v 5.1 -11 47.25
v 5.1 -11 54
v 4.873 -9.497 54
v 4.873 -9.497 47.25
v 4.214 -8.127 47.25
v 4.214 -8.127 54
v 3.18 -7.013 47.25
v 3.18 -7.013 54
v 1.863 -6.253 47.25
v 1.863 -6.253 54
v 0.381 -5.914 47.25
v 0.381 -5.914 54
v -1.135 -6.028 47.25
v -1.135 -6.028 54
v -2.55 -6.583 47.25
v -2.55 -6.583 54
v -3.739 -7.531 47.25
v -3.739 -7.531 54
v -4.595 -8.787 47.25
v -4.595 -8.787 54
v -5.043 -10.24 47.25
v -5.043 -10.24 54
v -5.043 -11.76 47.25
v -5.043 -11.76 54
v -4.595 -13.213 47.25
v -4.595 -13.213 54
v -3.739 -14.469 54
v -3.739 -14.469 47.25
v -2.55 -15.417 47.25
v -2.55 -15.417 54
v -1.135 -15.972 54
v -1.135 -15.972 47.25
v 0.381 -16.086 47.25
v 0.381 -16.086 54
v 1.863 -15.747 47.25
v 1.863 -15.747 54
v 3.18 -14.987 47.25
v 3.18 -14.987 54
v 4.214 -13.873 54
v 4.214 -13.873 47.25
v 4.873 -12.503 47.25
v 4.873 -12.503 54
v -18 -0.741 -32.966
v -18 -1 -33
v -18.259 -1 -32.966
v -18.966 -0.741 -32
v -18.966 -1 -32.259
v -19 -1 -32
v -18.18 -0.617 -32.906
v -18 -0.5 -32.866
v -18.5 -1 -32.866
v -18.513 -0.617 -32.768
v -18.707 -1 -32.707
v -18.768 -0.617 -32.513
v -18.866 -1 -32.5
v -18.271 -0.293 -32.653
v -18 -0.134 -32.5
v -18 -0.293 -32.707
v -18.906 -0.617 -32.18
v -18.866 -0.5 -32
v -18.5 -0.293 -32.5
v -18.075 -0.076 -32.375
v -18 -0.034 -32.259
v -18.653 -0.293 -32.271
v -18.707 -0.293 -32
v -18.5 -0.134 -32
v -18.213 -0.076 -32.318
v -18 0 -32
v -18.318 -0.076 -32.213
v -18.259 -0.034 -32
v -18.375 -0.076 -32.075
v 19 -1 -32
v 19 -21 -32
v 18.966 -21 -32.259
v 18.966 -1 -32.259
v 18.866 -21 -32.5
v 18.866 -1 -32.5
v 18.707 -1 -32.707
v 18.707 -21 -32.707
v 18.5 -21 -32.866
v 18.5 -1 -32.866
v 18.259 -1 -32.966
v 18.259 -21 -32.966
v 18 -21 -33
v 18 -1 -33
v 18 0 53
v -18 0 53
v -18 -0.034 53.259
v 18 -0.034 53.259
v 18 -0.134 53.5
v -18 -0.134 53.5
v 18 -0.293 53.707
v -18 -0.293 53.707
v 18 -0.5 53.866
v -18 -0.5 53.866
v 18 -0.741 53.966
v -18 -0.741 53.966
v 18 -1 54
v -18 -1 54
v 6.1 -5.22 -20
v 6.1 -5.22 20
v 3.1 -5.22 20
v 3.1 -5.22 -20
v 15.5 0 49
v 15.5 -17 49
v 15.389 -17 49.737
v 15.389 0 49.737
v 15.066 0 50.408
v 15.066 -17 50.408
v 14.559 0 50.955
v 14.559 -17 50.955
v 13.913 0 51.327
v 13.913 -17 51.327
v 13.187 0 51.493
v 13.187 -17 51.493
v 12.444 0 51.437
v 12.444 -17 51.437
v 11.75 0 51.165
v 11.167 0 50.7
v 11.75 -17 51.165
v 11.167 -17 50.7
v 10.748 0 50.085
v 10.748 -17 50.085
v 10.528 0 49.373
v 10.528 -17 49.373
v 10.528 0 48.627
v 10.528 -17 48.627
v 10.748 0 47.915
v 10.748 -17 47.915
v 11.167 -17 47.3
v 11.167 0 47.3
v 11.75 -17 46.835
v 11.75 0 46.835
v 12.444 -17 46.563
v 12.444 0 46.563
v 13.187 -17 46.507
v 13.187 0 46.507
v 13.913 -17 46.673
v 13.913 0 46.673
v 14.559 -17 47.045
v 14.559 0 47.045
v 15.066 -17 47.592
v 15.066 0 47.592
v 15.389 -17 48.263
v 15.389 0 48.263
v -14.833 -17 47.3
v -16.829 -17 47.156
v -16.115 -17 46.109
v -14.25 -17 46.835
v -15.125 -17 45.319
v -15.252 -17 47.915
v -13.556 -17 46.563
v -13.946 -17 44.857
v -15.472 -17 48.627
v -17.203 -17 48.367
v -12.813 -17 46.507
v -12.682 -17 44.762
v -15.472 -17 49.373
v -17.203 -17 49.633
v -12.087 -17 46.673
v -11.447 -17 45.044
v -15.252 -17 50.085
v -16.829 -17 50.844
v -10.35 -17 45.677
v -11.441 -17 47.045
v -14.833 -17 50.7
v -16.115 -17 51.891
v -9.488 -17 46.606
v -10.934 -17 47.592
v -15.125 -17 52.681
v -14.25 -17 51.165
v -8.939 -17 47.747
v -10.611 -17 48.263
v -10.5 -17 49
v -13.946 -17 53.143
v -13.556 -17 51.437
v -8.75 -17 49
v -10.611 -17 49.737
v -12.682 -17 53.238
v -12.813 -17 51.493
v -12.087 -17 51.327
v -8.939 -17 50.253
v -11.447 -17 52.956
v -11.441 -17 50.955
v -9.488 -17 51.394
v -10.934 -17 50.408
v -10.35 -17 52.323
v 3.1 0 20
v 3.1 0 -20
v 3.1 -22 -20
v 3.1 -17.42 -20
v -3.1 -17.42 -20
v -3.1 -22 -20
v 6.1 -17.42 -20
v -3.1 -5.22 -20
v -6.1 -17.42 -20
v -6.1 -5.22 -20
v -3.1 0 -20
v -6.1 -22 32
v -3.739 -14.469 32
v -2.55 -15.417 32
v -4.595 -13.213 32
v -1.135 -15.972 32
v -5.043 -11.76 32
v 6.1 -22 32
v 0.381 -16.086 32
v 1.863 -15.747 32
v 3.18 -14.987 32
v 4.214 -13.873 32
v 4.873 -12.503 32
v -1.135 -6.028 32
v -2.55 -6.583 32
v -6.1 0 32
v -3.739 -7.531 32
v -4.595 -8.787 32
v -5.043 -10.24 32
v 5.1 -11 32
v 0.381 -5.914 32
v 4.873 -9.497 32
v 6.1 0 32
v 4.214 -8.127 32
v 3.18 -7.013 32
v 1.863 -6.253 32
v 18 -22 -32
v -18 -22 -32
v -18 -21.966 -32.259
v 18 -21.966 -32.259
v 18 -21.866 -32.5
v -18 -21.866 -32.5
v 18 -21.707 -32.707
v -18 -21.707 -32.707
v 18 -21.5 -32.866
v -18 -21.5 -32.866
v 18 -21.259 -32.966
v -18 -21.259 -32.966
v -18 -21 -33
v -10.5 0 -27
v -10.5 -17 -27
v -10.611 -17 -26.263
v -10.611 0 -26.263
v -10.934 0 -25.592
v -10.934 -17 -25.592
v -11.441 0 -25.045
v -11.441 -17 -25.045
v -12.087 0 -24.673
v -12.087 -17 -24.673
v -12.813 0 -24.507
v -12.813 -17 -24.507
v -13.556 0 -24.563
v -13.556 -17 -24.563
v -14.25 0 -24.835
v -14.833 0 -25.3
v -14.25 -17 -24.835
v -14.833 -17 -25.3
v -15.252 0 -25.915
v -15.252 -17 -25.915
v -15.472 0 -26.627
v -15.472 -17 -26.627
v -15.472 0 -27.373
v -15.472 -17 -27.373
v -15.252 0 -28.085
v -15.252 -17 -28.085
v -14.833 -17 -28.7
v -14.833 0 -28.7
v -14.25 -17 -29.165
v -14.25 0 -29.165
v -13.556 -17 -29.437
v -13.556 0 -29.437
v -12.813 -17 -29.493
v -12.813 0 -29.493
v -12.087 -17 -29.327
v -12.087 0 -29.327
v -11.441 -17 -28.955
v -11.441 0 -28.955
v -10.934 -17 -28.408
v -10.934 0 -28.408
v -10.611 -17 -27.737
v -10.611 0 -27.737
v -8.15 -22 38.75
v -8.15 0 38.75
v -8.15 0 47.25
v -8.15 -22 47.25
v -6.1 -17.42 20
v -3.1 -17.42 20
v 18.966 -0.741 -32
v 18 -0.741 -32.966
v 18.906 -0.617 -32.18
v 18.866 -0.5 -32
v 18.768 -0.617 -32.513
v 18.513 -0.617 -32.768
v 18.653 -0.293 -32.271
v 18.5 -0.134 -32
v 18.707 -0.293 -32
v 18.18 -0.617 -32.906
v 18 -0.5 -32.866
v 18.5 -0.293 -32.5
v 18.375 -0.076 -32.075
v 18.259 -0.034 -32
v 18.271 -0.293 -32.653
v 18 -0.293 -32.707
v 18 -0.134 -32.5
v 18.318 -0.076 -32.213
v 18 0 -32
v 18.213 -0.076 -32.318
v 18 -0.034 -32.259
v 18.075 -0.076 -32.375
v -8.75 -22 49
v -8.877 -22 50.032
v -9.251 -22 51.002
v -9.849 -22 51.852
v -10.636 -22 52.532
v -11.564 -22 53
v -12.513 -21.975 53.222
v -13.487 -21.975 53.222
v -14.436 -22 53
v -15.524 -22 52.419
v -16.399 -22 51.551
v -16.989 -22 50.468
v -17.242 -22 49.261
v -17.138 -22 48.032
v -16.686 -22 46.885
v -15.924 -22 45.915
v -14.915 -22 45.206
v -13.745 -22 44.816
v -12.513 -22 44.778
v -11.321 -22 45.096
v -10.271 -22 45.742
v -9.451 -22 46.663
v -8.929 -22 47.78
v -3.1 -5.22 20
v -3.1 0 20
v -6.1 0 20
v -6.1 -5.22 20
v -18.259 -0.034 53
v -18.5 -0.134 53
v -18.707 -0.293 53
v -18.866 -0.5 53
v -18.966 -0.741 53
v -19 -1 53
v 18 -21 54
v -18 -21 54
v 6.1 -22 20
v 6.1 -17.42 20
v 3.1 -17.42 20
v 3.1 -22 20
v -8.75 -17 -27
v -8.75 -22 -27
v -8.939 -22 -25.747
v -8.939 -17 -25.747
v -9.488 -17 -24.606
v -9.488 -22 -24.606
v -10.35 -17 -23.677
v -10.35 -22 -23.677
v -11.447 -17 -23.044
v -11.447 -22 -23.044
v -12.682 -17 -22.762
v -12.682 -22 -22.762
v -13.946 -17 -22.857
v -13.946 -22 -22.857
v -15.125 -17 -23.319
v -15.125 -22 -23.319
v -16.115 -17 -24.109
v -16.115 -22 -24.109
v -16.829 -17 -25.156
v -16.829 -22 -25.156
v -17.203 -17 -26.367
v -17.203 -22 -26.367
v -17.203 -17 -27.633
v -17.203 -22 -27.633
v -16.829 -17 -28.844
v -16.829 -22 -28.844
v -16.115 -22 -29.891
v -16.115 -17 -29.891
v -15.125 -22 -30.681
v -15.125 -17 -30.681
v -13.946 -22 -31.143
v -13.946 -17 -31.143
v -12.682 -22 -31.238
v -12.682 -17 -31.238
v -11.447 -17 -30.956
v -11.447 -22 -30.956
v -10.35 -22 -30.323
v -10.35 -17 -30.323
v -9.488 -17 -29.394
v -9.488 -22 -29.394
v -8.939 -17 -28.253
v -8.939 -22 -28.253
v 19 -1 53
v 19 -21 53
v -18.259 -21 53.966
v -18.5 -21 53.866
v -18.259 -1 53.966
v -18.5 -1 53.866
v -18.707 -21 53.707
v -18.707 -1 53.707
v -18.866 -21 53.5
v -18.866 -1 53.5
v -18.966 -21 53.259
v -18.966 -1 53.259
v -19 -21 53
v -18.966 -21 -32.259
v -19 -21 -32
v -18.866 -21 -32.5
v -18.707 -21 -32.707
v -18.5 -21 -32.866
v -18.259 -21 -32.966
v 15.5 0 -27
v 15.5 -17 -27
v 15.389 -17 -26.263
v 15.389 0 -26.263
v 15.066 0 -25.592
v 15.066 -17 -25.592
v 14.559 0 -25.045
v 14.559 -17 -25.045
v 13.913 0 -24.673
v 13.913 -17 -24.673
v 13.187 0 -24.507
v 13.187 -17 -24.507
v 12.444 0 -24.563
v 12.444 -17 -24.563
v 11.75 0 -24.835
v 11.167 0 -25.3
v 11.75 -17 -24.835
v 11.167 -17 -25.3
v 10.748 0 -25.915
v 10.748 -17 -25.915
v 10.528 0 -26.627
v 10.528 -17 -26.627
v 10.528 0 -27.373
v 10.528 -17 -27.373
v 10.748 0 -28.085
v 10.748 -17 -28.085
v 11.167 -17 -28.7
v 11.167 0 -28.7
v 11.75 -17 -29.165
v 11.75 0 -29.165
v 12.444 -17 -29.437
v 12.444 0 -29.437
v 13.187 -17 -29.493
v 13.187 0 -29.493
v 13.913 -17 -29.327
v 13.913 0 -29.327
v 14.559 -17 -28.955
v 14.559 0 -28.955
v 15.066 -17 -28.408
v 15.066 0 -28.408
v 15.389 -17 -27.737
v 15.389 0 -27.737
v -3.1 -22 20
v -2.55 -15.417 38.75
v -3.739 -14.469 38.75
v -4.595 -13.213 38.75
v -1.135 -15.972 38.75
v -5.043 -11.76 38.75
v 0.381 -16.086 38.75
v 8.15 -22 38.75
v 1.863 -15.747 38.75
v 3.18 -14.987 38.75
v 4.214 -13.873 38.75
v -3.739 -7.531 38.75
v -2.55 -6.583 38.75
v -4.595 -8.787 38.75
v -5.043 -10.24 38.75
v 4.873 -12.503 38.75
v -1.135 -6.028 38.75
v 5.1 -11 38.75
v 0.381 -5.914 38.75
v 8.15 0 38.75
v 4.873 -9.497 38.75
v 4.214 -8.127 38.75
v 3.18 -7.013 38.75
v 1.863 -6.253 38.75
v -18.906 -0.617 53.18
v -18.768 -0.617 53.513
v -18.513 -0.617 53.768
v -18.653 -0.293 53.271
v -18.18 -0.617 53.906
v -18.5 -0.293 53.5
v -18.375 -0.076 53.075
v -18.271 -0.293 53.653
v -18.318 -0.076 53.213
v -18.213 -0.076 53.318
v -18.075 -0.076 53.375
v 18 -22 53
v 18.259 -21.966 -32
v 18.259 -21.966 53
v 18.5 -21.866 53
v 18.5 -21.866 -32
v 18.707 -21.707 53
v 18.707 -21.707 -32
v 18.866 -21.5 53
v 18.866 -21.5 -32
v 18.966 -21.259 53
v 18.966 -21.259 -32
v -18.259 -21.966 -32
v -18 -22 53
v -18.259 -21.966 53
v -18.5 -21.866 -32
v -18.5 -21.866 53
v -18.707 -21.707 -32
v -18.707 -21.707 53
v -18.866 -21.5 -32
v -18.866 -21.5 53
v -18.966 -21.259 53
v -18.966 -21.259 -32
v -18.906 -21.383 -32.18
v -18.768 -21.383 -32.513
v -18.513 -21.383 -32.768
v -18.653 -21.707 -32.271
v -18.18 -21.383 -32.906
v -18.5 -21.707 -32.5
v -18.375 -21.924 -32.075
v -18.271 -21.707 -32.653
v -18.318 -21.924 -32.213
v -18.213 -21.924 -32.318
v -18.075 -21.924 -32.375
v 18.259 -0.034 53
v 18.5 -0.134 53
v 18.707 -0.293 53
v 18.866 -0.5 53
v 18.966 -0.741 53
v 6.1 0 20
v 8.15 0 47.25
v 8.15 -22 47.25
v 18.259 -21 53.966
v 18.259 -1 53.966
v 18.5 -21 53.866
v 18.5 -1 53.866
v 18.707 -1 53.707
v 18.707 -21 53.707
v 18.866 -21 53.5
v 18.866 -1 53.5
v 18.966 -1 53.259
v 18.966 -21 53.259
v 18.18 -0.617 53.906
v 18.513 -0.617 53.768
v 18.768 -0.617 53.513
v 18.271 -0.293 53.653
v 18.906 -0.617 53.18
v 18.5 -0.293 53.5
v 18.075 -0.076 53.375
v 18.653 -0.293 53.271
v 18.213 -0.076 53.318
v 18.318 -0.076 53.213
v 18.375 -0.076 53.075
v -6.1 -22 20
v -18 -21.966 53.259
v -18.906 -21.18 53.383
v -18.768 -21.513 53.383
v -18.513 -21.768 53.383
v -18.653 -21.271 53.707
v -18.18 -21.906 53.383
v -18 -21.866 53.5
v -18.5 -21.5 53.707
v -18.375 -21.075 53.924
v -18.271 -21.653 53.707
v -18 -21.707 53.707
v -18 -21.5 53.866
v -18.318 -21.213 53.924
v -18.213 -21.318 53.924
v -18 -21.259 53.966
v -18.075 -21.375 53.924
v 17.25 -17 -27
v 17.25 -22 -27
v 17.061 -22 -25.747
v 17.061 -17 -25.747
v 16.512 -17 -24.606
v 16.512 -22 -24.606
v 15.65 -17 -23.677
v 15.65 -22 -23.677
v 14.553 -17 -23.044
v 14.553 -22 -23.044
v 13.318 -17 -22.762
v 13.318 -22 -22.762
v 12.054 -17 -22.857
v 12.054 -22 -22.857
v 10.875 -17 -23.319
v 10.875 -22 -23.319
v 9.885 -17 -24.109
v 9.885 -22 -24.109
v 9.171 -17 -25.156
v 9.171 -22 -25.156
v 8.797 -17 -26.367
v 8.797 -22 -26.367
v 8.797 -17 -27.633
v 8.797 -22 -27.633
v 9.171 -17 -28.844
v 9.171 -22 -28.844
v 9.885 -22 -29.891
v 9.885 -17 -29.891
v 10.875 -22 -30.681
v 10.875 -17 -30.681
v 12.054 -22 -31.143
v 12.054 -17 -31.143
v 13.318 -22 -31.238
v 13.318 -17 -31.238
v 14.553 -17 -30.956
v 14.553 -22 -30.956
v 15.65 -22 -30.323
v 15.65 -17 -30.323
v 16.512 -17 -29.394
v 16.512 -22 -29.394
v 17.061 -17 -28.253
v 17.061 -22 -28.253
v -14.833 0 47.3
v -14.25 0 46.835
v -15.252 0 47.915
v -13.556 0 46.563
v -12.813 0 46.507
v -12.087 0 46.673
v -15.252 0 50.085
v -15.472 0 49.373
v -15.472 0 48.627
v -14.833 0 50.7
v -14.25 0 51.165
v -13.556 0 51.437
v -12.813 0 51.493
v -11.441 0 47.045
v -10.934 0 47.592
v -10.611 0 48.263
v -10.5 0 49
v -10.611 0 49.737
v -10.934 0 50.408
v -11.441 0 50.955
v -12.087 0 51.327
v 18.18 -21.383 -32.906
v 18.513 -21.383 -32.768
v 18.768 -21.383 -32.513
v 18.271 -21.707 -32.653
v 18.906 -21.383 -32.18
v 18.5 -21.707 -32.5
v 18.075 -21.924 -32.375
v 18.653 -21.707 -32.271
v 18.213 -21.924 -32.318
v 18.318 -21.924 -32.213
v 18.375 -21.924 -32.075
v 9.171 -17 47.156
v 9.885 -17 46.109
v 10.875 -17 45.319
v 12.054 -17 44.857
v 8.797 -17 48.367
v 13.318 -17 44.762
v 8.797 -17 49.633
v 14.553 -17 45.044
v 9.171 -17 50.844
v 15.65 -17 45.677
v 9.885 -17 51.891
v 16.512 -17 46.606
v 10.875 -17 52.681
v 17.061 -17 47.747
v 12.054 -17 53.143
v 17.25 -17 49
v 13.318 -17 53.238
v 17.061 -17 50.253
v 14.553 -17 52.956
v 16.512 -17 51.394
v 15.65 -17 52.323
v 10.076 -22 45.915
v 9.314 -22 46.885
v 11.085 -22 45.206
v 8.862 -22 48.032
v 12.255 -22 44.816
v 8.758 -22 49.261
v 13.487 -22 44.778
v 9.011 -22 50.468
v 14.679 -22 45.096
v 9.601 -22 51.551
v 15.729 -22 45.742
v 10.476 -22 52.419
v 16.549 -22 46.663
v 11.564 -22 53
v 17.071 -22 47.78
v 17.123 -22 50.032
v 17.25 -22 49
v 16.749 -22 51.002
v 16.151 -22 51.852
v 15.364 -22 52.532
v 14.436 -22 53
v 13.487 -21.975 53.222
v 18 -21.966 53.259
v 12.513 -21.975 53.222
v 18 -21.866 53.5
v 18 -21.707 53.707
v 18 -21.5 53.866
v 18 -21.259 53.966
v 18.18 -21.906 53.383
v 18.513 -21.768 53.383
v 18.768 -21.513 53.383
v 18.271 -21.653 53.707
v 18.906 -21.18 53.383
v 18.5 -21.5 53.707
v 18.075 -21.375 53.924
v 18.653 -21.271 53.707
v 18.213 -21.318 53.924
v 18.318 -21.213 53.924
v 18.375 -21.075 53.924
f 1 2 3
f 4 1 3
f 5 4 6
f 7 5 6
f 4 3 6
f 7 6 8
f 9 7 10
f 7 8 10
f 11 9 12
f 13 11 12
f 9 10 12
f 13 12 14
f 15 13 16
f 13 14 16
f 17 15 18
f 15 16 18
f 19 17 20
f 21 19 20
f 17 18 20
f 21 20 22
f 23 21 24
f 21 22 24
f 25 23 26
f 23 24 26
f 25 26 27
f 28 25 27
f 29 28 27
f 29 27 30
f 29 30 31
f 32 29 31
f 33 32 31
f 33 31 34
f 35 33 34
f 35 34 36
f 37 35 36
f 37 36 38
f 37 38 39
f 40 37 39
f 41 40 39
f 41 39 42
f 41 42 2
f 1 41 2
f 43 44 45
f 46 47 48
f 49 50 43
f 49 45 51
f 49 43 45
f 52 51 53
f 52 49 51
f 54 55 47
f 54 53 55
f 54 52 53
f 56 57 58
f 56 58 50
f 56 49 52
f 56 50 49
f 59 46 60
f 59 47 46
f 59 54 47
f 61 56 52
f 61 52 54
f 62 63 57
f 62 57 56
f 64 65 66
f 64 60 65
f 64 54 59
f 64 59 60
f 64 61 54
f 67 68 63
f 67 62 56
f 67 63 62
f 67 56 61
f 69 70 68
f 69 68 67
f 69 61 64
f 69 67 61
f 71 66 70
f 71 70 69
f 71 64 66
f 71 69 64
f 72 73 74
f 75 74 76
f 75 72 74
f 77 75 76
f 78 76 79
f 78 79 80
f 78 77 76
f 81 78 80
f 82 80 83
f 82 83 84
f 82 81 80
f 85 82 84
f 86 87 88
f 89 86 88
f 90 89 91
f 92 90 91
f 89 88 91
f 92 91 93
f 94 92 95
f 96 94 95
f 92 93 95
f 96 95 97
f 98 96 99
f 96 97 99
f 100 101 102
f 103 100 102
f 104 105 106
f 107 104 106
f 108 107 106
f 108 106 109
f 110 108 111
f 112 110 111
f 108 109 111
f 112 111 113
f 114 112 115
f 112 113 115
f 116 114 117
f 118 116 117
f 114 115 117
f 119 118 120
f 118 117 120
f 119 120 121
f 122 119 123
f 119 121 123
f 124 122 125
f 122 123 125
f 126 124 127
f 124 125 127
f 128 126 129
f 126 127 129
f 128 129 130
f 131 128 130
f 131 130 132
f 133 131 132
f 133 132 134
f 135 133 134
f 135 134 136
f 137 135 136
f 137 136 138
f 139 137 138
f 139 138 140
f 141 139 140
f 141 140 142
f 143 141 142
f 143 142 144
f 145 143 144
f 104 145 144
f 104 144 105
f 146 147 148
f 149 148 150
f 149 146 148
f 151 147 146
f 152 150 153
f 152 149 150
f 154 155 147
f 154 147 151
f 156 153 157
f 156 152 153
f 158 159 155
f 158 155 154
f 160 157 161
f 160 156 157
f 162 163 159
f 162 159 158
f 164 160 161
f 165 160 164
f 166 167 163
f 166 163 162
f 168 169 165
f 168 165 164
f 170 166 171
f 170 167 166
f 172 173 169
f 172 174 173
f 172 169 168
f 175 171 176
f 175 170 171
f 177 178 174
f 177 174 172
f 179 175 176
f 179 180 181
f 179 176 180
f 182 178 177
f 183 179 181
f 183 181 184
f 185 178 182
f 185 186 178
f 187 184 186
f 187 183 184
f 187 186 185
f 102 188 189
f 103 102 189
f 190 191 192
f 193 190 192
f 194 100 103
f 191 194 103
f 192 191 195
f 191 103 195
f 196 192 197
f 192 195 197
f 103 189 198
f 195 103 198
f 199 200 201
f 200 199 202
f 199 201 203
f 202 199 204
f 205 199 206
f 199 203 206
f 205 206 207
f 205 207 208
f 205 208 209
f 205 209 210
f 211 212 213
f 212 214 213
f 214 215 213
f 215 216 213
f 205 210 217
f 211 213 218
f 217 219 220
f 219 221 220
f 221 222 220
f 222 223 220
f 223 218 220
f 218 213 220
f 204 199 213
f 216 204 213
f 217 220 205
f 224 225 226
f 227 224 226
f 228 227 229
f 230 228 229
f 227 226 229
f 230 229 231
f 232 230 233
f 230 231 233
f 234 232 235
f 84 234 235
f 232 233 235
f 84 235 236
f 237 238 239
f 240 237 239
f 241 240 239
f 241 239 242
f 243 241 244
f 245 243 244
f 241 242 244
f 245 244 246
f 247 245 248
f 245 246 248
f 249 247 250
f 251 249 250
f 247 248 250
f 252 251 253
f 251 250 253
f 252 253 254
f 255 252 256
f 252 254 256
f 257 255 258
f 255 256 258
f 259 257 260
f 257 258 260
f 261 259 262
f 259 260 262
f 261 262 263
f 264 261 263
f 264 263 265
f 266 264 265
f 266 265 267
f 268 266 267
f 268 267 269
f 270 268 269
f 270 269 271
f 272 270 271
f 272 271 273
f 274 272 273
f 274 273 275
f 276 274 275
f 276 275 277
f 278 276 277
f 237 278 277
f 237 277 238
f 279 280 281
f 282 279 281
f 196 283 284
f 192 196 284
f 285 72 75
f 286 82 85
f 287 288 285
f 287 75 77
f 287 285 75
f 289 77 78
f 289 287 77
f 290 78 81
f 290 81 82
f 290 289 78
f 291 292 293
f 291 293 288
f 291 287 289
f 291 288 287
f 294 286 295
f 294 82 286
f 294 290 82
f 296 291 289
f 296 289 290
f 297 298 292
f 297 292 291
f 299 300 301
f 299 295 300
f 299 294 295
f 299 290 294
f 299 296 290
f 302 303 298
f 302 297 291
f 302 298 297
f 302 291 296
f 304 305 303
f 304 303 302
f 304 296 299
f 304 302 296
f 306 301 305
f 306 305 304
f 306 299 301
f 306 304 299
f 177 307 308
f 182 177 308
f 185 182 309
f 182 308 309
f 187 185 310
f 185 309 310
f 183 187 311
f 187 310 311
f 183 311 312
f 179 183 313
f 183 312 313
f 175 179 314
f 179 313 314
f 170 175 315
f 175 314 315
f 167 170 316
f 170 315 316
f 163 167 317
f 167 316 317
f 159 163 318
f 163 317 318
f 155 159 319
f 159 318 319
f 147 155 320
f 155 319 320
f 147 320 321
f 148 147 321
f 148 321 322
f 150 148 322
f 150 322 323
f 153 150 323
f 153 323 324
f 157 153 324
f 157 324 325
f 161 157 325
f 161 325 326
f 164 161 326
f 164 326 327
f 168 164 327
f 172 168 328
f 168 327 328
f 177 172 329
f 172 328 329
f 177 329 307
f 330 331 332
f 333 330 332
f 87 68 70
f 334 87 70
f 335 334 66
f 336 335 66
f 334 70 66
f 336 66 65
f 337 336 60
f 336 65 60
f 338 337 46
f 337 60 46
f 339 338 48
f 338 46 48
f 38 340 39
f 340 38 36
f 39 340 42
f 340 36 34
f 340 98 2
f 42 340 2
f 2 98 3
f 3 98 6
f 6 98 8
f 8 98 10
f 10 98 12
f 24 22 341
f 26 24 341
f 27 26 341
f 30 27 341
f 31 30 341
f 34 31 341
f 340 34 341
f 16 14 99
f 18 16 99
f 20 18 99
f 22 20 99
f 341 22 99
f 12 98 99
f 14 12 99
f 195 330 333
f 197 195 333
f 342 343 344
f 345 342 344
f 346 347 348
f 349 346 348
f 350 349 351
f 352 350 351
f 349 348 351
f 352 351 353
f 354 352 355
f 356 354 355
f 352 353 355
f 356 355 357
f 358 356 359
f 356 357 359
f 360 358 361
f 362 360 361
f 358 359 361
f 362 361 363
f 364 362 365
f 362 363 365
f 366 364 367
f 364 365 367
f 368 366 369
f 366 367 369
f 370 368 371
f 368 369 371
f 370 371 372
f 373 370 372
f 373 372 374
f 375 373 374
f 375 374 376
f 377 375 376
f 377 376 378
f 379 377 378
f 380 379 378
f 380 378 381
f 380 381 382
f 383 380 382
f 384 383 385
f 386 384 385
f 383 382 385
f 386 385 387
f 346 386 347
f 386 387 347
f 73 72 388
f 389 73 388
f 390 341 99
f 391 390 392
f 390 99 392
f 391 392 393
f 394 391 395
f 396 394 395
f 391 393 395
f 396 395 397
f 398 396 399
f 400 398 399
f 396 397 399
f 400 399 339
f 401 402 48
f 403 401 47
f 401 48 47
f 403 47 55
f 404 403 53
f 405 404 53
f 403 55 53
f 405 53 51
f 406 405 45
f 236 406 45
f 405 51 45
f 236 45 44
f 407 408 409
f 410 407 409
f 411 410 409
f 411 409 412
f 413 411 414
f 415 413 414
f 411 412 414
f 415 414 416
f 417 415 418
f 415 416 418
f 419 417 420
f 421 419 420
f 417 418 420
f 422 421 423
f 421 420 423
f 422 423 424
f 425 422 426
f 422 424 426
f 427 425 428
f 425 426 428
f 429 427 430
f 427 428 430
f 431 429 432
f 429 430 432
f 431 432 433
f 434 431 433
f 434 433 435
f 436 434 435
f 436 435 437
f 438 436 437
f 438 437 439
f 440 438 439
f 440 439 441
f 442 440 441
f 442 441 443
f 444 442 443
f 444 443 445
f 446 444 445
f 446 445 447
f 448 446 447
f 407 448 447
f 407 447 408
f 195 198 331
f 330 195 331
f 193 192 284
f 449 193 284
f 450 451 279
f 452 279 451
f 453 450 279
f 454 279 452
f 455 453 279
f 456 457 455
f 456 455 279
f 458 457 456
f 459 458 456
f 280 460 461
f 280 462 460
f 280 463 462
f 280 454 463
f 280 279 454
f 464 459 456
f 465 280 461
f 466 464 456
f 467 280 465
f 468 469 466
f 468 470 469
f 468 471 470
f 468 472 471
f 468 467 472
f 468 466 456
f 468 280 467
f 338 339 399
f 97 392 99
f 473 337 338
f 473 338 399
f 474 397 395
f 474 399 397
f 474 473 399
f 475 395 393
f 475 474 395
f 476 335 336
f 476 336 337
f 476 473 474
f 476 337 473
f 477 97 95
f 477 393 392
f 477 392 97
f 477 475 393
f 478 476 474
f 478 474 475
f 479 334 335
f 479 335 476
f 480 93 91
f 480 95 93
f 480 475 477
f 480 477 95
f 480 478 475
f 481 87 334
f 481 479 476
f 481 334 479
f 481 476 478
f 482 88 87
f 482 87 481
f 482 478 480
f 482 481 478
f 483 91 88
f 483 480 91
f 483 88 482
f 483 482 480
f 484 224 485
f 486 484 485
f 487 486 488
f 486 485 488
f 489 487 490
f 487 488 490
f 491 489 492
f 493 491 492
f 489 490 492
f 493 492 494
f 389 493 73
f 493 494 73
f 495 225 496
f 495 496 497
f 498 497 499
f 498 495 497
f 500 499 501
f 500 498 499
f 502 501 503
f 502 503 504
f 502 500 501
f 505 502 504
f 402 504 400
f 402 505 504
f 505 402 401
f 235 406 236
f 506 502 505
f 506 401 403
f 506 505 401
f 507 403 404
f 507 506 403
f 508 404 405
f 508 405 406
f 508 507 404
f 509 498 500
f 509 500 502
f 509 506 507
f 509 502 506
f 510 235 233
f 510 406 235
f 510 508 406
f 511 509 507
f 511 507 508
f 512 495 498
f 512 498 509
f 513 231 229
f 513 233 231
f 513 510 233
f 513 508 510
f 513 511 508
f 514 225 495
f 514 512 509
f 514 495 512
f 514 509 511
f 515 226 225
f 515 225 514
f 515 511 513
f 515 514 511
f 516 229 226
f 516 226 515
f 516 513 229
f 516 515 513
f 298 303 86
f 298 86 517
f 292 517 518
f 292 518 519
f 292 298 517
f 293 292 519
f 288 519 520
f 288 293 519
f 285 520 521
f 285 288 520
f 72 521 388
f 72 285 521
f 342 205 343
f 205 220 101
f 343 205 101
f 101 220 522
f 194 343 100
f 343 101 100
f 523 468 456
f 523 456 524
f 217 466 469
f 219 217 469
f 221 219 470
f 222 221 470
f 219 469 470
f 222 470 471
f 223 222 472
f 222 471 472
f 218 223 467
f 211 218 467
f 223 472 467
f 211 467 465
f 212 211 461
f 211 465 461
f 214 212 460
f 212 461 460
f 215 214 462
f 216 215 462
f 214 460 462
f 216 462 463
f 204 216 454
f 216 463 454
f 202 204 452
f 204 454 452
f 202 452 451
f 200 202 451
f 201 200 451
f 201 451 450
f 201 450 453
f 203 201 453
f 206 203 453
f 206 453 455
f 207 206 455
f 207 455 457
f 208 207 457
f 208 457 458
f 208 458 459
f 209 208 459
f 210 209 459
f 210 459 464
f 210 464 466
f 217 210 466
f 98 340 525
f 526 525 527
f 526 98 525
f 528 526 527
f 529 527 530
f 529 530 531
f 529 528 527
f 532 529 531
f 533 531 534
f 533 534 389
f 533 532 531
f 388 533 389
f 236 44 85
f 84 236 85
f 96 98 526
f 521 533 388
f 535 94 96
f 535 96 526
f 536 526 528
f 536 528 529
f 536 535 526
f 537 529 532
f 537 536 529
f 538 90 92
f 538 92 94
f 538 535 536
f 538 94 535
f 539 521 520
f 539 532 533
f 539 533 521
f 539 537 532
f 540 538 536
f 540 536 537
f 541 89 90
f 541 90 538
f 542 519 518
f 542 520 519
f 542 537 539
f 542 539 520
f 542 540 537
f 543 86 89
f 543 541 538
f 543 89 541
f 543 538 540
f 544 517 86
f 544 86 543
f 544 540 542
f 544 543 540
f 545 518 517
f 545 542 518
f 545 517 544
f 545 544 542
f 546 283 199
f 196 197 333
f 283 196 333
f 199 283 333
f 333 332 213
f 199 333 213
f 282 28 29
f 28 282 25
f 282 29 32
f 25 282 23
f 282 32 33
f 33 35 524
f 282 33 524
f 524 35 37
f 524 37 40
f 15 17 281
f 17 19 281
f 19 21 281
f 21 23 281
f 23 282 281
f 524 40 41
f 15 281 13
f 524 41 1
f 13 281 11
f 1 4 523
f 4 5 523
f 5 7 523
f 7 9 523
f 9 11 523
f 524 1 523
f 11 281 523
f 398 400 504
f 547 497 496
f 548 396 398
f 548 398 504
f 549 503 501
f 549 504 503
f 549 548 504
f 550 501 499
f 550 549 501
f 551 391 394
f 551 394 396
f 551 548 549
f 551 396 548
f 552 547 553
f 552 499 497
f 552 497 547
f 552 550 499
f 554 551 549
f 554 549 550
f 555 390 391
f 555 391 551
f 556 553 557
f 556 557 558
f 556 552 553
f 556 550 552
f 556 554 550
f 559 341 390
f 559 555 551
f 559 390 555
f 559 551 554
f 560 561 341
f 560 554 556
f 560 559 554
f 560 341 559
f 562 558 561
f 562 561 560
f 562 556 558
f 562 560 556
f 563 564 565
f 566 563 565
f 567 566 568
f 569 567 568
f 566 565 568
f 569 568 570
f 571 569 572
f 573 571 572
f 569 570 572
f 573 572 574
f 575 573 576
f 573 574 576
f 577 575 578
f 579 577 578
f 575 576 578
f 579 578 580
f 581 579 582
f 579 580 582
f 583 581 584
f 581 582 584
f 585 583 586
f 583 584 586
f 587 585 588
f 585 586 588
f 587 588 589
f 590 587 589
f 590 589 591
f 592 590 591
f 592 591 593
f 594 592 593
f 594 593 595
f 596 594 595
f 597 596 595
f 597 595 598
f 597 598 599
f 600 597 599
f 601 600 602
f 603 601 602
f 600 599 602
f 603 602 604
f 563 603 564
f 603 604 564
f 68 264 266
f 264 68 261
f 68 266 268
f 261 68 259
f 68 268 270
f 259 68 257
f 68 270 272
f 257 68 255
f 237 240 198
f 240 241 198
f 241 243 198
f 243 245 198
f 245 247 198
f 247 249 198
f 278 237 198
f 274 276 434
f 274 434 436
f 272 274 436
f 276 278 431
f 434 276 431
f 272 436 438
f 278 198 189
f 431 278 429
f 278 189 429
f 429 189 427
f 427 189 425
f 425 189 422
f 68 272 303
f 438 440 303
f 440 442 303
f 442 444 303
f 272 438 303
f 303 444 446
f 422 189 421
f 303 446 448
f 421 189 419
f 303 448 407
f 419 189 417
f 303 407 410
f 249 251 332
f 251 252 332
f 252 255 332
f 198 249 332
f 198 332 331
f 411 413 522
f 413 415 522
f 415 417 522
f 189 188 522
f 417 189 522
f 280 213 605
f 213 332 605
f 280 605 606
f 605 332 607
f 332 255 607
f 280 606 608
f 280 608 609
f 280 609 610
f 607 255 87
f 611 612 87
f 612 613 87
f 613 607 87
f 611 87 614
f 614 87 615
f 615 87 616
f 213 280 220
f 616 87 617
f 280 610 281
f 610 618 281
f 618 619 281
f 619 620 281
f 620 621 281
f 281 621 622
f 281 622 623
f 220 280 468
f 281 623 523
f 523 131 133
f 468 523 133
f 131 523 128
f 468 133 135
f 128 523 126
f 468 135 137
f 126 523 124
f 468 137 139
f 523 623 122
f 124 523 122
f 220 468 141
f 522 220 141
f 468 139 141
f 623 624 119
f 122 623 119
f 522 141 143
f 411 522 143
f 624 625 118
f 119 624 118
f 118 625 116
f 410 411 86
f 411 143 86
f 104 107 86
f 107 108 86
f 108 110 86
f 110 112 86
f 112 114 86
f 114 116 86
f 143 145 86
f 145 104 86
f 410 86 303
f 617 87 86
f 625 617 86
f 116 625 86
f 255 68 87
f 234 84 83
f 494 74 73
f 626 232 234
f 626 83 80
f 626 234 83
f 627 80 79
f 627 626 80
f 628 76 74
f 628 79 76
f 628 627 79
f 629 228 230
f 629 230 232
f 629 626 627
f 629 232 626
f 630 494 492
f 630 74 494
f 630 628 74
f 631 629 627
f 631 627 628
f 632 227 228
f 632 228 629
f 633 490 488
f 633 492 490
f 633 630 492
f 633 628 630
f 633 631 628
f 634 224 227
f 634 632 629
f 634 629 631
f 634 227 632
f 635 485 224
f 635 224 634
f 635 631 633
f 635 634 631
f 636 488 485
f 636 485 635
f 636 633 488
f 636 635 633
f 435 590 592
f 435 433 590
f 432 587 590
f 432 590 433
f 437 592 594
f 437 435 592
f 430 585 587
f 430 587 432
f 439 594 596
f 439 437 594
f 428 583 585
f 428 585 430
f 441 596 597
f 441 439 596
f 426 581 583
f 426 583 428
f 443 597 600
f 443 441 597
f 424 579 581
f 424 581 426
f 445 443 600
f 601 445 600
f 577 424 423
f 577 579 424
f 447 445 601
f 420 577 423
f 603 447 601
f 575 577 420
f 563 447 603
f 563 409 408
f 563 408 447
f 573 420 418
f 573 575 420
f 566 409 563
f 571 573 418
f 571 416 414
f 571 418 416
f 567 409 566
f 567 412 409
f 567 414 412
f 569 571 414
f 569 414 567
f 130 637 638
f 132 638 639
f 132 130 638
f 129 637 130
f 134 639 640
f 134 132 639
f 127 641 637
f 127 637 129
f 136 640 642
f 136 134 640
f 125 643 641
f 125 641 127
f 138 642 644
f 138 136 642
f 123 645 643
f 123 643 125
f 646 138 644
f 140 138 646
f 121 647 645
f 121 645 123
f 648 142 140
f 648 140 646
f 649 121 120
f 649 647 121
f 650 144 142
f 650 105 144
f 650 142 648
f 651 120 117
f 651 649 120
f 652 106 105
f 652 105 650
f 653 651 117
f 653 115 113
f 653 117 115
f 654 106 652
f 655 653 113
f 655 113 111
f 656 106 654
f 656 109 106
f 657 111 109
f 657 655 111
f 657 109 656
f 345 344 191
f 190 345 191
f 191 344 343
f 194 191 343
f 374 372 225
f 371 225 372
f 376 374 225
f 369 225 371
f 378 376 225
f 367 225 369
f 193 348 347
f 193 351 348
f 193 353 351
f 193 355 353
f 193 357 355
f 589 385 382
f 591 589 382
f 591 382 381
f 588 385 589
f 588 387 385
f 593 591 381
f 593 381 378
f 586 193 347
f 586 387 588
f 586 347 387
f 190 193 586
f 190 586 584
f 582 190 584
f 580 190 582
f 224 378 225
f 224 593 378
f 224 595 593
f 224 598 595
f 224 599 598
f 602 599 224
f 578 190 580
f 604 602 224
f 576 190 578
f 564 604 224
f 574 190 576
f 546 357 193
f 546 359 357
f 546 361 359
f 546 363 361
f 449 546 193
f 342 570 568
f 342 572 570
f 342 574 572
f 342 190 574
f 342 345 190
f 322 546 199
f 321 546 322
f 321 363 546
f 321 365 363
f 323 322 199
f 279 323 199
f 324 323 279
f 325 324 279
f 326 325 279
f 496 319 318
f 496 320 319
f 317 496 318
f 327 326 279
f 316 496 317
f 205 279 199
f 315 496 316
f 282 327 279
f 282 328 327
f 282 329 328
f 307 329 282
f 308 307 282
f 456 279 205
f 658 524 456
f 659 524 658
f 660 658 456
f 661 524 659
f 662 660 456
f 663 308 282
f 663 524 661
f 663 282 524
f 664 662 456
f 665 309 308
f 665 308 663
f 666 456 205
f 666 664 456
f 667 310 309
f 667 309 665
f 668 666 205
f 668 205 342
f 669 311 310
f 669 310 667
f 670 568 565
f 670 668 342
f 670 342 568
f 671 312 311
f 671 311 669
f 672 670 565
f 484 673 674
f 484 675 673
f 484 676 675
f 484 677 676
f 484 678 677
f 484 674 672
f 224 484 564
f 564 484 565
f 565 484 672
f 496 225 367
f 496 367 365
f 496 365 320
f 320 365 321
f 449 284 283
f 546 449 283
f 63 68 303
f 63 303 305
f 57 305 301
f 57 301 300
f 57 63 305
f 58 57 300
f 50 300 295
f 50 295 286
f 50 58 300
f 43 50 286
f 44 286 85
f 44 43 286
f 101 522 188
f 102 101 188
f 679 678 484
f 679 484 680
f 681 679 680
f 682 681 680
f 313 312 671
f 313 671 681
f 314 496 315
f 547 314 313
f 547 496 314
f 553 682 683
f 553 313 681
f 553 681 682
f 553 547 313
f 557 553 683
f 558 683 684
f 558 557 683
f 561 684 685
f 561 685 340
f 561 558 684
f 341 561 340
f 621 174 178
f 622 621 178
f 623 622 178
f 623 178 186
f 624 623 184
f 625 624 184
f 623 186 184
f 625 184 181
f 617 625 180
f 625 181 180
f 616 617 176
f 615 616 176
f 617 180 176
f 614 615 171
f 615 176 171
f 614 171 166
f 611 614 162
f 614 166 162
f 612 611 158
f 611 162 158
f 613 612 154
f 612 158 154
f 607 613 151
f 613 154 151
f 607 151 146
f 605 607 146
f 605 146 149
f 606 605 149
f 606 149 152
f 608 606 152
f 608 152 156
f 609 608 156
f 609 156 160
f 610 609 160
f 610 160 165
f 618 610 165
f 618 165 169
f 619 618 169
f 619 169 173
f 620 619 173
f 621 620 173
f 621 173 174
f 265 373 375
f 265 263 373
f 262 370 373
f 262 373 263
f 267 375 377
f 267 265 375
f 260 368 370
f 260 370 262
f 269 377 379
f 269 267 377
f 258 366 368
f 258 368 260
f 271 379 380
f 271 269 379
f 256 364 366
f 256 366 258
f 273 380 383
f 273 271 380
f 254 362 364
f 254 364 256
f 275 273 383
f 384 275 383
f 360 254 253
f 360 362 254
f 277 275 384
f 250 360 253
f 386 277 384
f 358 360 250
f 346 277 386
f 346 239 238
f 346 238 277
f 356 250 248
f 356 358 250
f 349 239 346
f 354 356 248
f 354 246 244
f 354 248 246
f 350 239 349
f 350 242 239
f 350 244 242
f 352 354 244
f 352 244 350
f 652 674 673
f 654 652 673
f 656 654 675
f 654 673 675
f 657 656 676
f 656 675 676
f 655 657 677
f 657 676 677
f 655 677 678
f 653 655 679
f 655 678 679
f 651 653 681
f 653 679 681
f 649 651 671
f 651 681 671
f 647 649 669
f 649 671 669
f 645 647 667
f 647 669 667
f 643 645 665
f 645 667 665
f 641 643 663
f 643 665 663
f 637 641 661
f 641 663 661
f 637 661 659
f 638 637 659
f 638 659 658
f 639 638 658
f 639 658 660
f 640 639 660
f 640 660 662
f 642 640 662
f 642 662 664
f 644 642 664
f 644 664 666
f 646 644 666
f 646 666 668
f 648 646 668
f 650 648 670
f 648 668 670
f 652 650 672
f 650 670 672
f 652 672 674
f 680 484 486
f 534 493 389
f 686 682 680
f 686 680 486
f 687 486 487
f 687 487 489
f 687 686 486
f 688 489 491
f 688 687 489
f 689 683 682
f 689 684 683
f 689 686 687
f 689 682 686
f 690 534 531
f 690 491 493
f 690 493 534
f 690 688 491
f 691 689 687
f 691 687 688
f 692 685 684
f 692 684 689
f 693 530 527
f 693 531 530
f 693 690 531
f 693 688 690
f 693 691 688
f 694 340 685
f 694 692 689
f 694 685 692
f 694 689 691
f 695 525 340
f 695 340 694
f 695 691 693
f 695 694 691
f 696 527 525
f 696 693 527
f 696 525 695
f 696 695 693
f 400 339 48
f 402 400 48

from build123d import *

# Parameters (mm, degrees)
F0_W         = 16.3
F0_H         = 8.5
F1_DEPTH     = 22
F2_R         = 5.1
F3_DEPTH     = 22
F4_W         = 3
F4_H         = 12.2
F4_W_2       = 9.2
F5_DEPTH     = 40
F6_R         = 2.5
F7_DEPTH     = 22.001
F6_R_2       = 4.25
F8_DEPTH     = 5
F9_T1_DEPTH  = 85
F9_T3_DEPTH  = 36
F9_T5_DEPTH  = 20
F9_S9_W      = 1
F9_S9_H      = 1
F9_T10_DEPTH = 1
F9_S15_W     = 1
F9_S15_H     = 1
F9_T16_DEPTH = 1
F9_S21_W     = 1
F9_S21_H     = 1
F9_T22_DEPTH = 1
F9_S27_W     = 1
F9_S27_H     = 1
F9_T28_DEPTH = 1
F9_S33_W     = 1
F9_S33_H     = 1
F9_T34_DEPTH = 1
F9_S39_W     = 1
F9_S39_H     = 1
F9_T40_DEPTH = 1
F9_S45_W     = 1
F9_S45_H     = 1
F9_T46_DEPTH = 1
F9_S51_W     = 1
F9_S51_H     = 1
F9_T52_DEPTH = 1


# Not quite as in the source:
# - a fillet or chamfer that OpenCascade refuses, or shapes differently, is made with other operations: its cross-section is extruded or revolved along the edge and cut away or added


with BuildPart() as f1:
    # F0 (on Front) → F1 (new body)
    with BuildSketch(Plane.XZ):
        Polygon((-19, 32), (-6.1, 32), (6.1, 32), (19, 32), (19, 54), (-19, 54), align=None)
        with Locations((0, 43)):
            Rectangle(F0_W, F0_H, mode=Mode.SUBTRACT)
        Polygon((-3.1, -20), (-3.1, 20), (-6.1, 20), (-6.1, 32), (-19, 32), (-19, -33), (19, -33), (19, 32), (6.1, 32), (6.1, 20), (3.1, 20), (3.1, -20), align=None)
    extrude(amount=F1_DEPTH)

    # F2 (on face) → F3 (cut, through all)
    with BuildSketch(Plane.XY.offset(54)):
        with Locations((0, -11)):
            Circle(F2_R)
    extrude(amount=-F3_DEPTH, mode=Mode.SUBTRACT)

    # F4 (on face) → F5 (cut)
    with BuildSketch(Plane.XY.offset(20)):
        with Locations((-4.6, -11.319772105)):
            Rectangle(F4_W, F4_H)
        with Locations((1.5, -11.319772105)):
            Rectangle(F4_W_2, F4_H)
    extrude(amount=-F5_DEPTH, mode=Mode.SUBTRACT)

    # F6 (on face) → F7 (cut, through all)
    with BuildSketch(Plane.XZ.offset(22)):
        with Locations((-13, 49)):
            Circle(F6_R)
        with Locations((13, 49)):
            Circle(F6_R)
        with Locations((-13, -27)):
            Circle(F6_R)
        with Locations((13, -27)):
            Circle(F6_R)
    extrude(amount=-F7_DEPTH, mode=Mode.SUBTRACT)

    # F6 (on face) → F8 (cut)
    with BuildSketch(Plane.XZ.offset(22)):
        with Locations((-13, 49)):
            Circle(F6_R_2)
        with Locations((-13, 49)):
            Circle(F6_R, mode=Mode.SUBTRACT)
        with Locations((13, 49)):
            Circle(F6_R_2)
        with Locations((13, 49)):
            Circle(F6_R, mode=Mode.SUBTRACT)
        with Locations((13, -27)):
            Circle(F6_R_2)
        with Locations((13, -27)):
            Circle(F6_R, mode=Mode.SUBTRACT)
        with Locations((-13, -27)):
            Circle(F6_R_2)
        with Locations((-13, -27)):
            Circle(F6_R, mode=Mode.SUBTRACT)
    extrude(amount=-F8_DEPTH, mode=Mode.SUBTRACT)

    # F9: fillet of radius 1 on 12 edges, made by hand

    # F9_s2 → F9_t1 (cut)
    with BuildSketch(Plane.XY.offset(-32)):
        with BuildLine():
            ThreePointArc((18, -22), (18.7071067812, -21.7071067812), (19, -21))
            Line((19, -21), (19, -22))
            Line((19, -22), (18, -22))
        make_face()
        with BuildLine():
            ThreePointArc((-18, -22), (-18.7071067812, -21.7071067812), (-19, -21))
            Line((-19, -21), (-19, -22))
            Line((-19, -22), (-18, -22))
        make_face()
        with BuildLine():
            ThreePointArc((-18, 0), (-18.7071067812, -0.2928932188), (-19, -1))
            Line((-19, -1), (-19, 0))
            Line((-19, 0), (-18, 0))
        make_face()
        with BuildLine():
            ThreePointArc((18, 0), (18.7071067812, -0.2928932188), (19, -1))
            Line((19, -1), (19, 0))
            Line((19, 0), (18, 0))
        make_face()
    extrude(amount=F9_T1_DEPTH, mode=Mode.SUBTRACT)

    # F9_s4 → F9_t3 (cut)
    with BuildSketch(Plane.YZ.offset(-18)):
        with BuildLine():
            ThreePointArc((-22, 53), (-21.7071067812, 53.7071067812), (-21, 54))
            Line((-21, 54), (-22, 54))
            Line((-22, 54), (-22, 53))
        make_face()
        with BuildLine():
            ThreePointArc((-22, -32), (-21.7071067812, -32.7071067812), (-21, -33))
            Line((-21, -33), (-22, -33))
            Line((-22, -33), (-22, -32))
        make_face()
        with BuildLine():
            ThreePointArc((0, 53), (-0.2928932188, 53.7071067812), (-1, 54))
            Line((-1, 54), (0, 54))
            Line((0, 54), (0, 53))
        make_face()
        with BuildLine():
            ThreePointArc((0, -32), (-0.2928932188, -32.7071067812), (-1, -33))
            Line((-1, -33), (0, -33))
            Line((0, -33), (0, -32))
        make_face()
    extrude(amount=F9_T3_DEPTH, mode=Mode.SUBTRACT)

    # F9_s6 → F9_t5 (cut)
    with BuildSketch(Plane.XZ.offset(1)):
        with BuildLine():
            ThreePointArc((19, -32), (18.7071067812, -32.7071067812), (18, -33))
            Line((18, -33), (19, -33))
            Line((19, -33), (19, -32))
        make_face()
        with BuildLine():
            ThreePointArc((18, 54), (18.7071067812, 53.7071067812), (19, 53))
            Line((19, 53), (19, 54))
            Line((19, 54), (18, 54))
        make_face()
        with BuildLine():
            ThreePointArc((-18, 54), (-18.7071067812, 53.7071067812), (-19, 53))
            Line((-19, 53), (-19, 54))
            Line((-19, 54), (-18, 54))
        make_face()
        with BuildLine():
            ThreePointArc((-19, -32), (-18.7071067812, -32.7071067812), (-18, -33))
            Line((-18, -33), (-19, -33))
            Line((-19, -33), (-19, -32))
        make_face()
    extrude(amount=F9_T5_DEPTH, mode=Mode.SUBTRACT)


with BuildPart() as f9_tool8:
    # F9_s9 → F9_t10 (new body)
    with BuildSketch(Plane.XZ.offset(21)):
        with Locations((18.5, -32.5)):
            Rectangle(F9_S9_W, F9_S9_H)
    extrude(amount=F9_T10_DEPTH)

    # F9_s11 → F9_t12 (revolve, cut)
    with BuildSketch(Plane(origin=(18, -21, -32), x_dir=(-0.7071067812, 0, 0.7071067812), z_dir=(0.7071067812, 0, 0.7071067812))):
        with BuildLine():
            ThreePointArc((0, -1), (1, 0), (0, 1))
            Line((0, 1), (0, -1))
        make_face()
    revolve(axis=Axis((18, -21, -32), (0, -1, 0)), mode=Mode.SUBTRACT)


with BuildPart() as f1_1:
    add(f1.part)

    # F9_t7: cut F9_tool8
    add(f9_tool8.part, mode=Mode.SUBTRACT)


with BuildPart() as f9_tool14:
    # F9_s15 → F9_t16 (new body)
    with BuildSketch(Plane.XY.offset(53)):
        with Locations((18.5, -21.5)):
            Rectangle(F9_S15_W, F9_S15_H)
    extrude(amount=F9_T16_DEPTH)

    # F9_s17 → F9_t18 (revolve, cut)
    with BuildSketch(Plane(origin=(18, -21, 53), x_dir=(-0.7071067812, 0.7071067812, 0), z_dir=(0.7071067812, 0.7071067812, 0))):
        with BuildLine():
            ThreePointArc((0, -1), (1, 0), (0, 1))
            Line((0, 1), (0, -1))
        make_face()
    revolve(axis=Axis((18, -21, 53), (0, 0, 1)), mode=Mode.SUBTRACT)


with BuildPart() as f1_2:
    add(f1_1.part)

    # F9_t13: cut F9_tool14
    add(f9_tool14.part, mode=Mode.SUBTRACT)


with BuildPart() as f9_tool20:
    # F9_s21 → F9_t22 (new body)
    with BuildSketch(Plane.XY.offset(53)):
        with Locations((-18.5, -21.5)):
            Rectangle(F9_S21_W, F9_S21_H)
    extrude(amount=F9_T22_DEPTH)

    # F9_s23 → F9_t24 (revolve, cut)
    with BuildSketch(Plane(origin=(-18, -21, 53), x_dir=(0.7071067812, 0.7071067812, 0), z_dir=(0.7071067812, -0.7071067812, 0))):
        with BuildLine():
            ThreePointArc((0, -1), (1, 0), (0, 1))
            Line((0, 1), (0, -1))
        make_face()
    revolve(axis=Axis((-18, -21, 53), (0, 0, 1)), mode=Mode.SUBTRACT)


with BuildPart() as f1_3:
    add(f1_2.part)

    # F9_t19: cut F9_tool20
    add(f9_tool20.part, mode=Mode.SUBTRACT)


with BuildPart() as f9_tool26:
    # F9_s27 → F9_t28 (new body)
    with BuildSketch(Plane.XZ.offset(21)):
        with Locations((-18.5, -32.5)):
            Rectangle(F9_S27_W, F9_S27_H)
    extrude(amount=F9_T28_DEPTH)

    # F9_s29 → F9_t30 (revolve, cut)
    with BuildSketch(Plane(origin=(-18, -21, -32), x_dir=(0.7071067812, 0, 0.7071067812), z_dir=(0.7071067812, 0, -0.7071067812))):
        with BuildLine():
            ThreePointArc((0, -1), (1, 0), (0, 1))
            Line((0, 1), (0, -1))
        make_face()
    revolve(axis=Axis((-18, -21, -32), (0, -1, 0)), mode=Mode.SUBTRACT)


with BuildPart() as f1_4:
    add(f1_3.part)

    # F9_t25: cut F9_tool26
    add(f9_tool26.part, mode=Mode.SUBTRACT)


with BuildPart() as f9_tool32:
    # F9_s33 → F9_t34 (new body)
    with BuildSketch(Plane.XZ.offset(1)):
        with Locations((18.5, -32.5)):
            Rectangle(F9_S33_W, F9_S33_H)
    extrude(amount=-F9_T34_DEPTH)

    # F9_s35 → F9_t36 (revolve, cut)
    with BuildSketch(Plane(origin=(18, -1, -32), x_dir=(-0.7071067812, 0, 0.7071067812), z_dir=(-0.7071067812, 0, -0.7071067812))):
        with BuildLine():
            ThreePointArc((0, -1), (1, 0), (0, 1))
            Line((0, 1), (0, -1))
        make_face()
    revolve(axis=Axis((18, -1, -32), (0, 1, 0)), mode=Mode.SUBTRACT)


with BuildPart() as f1_5:
    add(f1_4.part)

    # F9_t31: cut F9_tool32
    add(f9_tool32.part, mode=Mode.SUBTRACT)


with BuildPart() as f9_tool38:
    # F9_s39 → F9_t40 (new body)
    with BuildSketch(Plane.XZ.offset(1)):
        with Locations((18.5, 53.5)):
            Rectangle(F9_S39_W, F9_S39_H)
    extrude(amount=-F9_T40_DEPTH)

    # F9_s41 → F9_t42 (revolve, cut)
    with BuildSketch(Plane(origin=(18, -1, 53), x_dir=(-0.7071067812, 0, -0.7071067812), z_dir=(0.7071067812, 0, -0.7071067812))):
        with BuildLine():
            ThreePointArc((0, -1), (1, 0), (0, 1))
            Line((0, 1), (0, -1))
        make_face()
    revolve(axis=Axis((18, -1, 53), (0, 1, 0)), mode=Mode.SUBTRACT)


with BuildPart() as f1_6:
    add(f1_5.part)

    # F9_t37: cut F9_tool38
    add(f9_tool38.part, mode=Mode.SUBTRACT)


with BuildPart() as f9_tool44:
    # F9_s45 → F9_t46 (new body)
    with BuildSketch(Plane.XZ.offset(1)):
        with Locations((-18.5, 53.5)):
            Rectangle(F9_S45_W, F9_S45_H)
    extrude(amount=-F9_T46_DEPTH)

    # F9_s47 → F9_t48 (revolve, cut)
    with BuildSketch(Plane(origin=(-18, -1, 53), x_dir=(0.7071067812, 0, -0.7071067812), z_dir=(0.7071067812, 0, 0.7071067812))):
        with BuildLine():
            ThreePointArc((0, -1), (1, 0), (0, 1))
            Line((0, 1), (0, -1))
        make_face()
    revolve(axis=Axis((-18, -1, 53), (0, 1, 0)), mode=Mode.SUBTRACT)


with BuildPart() as f1_7:
    add(f1_6.part)

    # F9_t43: cut F9_tool44
    add(f9_tool44.part, mode=Mode.SUBTRACT)


with BuildPart() as f9_tool50:
    # F9_s51 → F9_t52 (new body)
    with BuildSketch(Plane.XZ.offset(1)):
        with Locations((-18.5, -32.5)):
            Rectangle(F9_S51_W, F9_S51_H)
    extrude(amount=-F9_T52_DEPTH)

    # F9_s53 → F9_t54 (revolve, cut)
    with BuildSketch(Plane(origin=(-18, -1, -32), x_dir=(0.7071067812, 0, 0.7071067812), z_dir=(-0.7071067812, 0, 0.7071067812))):
        with BuildLine():
            ThreePointArc((0, -1), (1, 0), (0, 1))
            Line((0, 1), (0, -1))
        make_face()
    revolve(axis=Axis((-18, -1, -32), (0, 1, 0)), mode=Mode.SUBTRACT)


with BuildPart() as f1_8:
    add(f1_7.part)

    # F9_t49: cut F9_tool50
    add(f9_tool50.part, mode=Mode.SUBTRACT)


solid = f1_8.part
